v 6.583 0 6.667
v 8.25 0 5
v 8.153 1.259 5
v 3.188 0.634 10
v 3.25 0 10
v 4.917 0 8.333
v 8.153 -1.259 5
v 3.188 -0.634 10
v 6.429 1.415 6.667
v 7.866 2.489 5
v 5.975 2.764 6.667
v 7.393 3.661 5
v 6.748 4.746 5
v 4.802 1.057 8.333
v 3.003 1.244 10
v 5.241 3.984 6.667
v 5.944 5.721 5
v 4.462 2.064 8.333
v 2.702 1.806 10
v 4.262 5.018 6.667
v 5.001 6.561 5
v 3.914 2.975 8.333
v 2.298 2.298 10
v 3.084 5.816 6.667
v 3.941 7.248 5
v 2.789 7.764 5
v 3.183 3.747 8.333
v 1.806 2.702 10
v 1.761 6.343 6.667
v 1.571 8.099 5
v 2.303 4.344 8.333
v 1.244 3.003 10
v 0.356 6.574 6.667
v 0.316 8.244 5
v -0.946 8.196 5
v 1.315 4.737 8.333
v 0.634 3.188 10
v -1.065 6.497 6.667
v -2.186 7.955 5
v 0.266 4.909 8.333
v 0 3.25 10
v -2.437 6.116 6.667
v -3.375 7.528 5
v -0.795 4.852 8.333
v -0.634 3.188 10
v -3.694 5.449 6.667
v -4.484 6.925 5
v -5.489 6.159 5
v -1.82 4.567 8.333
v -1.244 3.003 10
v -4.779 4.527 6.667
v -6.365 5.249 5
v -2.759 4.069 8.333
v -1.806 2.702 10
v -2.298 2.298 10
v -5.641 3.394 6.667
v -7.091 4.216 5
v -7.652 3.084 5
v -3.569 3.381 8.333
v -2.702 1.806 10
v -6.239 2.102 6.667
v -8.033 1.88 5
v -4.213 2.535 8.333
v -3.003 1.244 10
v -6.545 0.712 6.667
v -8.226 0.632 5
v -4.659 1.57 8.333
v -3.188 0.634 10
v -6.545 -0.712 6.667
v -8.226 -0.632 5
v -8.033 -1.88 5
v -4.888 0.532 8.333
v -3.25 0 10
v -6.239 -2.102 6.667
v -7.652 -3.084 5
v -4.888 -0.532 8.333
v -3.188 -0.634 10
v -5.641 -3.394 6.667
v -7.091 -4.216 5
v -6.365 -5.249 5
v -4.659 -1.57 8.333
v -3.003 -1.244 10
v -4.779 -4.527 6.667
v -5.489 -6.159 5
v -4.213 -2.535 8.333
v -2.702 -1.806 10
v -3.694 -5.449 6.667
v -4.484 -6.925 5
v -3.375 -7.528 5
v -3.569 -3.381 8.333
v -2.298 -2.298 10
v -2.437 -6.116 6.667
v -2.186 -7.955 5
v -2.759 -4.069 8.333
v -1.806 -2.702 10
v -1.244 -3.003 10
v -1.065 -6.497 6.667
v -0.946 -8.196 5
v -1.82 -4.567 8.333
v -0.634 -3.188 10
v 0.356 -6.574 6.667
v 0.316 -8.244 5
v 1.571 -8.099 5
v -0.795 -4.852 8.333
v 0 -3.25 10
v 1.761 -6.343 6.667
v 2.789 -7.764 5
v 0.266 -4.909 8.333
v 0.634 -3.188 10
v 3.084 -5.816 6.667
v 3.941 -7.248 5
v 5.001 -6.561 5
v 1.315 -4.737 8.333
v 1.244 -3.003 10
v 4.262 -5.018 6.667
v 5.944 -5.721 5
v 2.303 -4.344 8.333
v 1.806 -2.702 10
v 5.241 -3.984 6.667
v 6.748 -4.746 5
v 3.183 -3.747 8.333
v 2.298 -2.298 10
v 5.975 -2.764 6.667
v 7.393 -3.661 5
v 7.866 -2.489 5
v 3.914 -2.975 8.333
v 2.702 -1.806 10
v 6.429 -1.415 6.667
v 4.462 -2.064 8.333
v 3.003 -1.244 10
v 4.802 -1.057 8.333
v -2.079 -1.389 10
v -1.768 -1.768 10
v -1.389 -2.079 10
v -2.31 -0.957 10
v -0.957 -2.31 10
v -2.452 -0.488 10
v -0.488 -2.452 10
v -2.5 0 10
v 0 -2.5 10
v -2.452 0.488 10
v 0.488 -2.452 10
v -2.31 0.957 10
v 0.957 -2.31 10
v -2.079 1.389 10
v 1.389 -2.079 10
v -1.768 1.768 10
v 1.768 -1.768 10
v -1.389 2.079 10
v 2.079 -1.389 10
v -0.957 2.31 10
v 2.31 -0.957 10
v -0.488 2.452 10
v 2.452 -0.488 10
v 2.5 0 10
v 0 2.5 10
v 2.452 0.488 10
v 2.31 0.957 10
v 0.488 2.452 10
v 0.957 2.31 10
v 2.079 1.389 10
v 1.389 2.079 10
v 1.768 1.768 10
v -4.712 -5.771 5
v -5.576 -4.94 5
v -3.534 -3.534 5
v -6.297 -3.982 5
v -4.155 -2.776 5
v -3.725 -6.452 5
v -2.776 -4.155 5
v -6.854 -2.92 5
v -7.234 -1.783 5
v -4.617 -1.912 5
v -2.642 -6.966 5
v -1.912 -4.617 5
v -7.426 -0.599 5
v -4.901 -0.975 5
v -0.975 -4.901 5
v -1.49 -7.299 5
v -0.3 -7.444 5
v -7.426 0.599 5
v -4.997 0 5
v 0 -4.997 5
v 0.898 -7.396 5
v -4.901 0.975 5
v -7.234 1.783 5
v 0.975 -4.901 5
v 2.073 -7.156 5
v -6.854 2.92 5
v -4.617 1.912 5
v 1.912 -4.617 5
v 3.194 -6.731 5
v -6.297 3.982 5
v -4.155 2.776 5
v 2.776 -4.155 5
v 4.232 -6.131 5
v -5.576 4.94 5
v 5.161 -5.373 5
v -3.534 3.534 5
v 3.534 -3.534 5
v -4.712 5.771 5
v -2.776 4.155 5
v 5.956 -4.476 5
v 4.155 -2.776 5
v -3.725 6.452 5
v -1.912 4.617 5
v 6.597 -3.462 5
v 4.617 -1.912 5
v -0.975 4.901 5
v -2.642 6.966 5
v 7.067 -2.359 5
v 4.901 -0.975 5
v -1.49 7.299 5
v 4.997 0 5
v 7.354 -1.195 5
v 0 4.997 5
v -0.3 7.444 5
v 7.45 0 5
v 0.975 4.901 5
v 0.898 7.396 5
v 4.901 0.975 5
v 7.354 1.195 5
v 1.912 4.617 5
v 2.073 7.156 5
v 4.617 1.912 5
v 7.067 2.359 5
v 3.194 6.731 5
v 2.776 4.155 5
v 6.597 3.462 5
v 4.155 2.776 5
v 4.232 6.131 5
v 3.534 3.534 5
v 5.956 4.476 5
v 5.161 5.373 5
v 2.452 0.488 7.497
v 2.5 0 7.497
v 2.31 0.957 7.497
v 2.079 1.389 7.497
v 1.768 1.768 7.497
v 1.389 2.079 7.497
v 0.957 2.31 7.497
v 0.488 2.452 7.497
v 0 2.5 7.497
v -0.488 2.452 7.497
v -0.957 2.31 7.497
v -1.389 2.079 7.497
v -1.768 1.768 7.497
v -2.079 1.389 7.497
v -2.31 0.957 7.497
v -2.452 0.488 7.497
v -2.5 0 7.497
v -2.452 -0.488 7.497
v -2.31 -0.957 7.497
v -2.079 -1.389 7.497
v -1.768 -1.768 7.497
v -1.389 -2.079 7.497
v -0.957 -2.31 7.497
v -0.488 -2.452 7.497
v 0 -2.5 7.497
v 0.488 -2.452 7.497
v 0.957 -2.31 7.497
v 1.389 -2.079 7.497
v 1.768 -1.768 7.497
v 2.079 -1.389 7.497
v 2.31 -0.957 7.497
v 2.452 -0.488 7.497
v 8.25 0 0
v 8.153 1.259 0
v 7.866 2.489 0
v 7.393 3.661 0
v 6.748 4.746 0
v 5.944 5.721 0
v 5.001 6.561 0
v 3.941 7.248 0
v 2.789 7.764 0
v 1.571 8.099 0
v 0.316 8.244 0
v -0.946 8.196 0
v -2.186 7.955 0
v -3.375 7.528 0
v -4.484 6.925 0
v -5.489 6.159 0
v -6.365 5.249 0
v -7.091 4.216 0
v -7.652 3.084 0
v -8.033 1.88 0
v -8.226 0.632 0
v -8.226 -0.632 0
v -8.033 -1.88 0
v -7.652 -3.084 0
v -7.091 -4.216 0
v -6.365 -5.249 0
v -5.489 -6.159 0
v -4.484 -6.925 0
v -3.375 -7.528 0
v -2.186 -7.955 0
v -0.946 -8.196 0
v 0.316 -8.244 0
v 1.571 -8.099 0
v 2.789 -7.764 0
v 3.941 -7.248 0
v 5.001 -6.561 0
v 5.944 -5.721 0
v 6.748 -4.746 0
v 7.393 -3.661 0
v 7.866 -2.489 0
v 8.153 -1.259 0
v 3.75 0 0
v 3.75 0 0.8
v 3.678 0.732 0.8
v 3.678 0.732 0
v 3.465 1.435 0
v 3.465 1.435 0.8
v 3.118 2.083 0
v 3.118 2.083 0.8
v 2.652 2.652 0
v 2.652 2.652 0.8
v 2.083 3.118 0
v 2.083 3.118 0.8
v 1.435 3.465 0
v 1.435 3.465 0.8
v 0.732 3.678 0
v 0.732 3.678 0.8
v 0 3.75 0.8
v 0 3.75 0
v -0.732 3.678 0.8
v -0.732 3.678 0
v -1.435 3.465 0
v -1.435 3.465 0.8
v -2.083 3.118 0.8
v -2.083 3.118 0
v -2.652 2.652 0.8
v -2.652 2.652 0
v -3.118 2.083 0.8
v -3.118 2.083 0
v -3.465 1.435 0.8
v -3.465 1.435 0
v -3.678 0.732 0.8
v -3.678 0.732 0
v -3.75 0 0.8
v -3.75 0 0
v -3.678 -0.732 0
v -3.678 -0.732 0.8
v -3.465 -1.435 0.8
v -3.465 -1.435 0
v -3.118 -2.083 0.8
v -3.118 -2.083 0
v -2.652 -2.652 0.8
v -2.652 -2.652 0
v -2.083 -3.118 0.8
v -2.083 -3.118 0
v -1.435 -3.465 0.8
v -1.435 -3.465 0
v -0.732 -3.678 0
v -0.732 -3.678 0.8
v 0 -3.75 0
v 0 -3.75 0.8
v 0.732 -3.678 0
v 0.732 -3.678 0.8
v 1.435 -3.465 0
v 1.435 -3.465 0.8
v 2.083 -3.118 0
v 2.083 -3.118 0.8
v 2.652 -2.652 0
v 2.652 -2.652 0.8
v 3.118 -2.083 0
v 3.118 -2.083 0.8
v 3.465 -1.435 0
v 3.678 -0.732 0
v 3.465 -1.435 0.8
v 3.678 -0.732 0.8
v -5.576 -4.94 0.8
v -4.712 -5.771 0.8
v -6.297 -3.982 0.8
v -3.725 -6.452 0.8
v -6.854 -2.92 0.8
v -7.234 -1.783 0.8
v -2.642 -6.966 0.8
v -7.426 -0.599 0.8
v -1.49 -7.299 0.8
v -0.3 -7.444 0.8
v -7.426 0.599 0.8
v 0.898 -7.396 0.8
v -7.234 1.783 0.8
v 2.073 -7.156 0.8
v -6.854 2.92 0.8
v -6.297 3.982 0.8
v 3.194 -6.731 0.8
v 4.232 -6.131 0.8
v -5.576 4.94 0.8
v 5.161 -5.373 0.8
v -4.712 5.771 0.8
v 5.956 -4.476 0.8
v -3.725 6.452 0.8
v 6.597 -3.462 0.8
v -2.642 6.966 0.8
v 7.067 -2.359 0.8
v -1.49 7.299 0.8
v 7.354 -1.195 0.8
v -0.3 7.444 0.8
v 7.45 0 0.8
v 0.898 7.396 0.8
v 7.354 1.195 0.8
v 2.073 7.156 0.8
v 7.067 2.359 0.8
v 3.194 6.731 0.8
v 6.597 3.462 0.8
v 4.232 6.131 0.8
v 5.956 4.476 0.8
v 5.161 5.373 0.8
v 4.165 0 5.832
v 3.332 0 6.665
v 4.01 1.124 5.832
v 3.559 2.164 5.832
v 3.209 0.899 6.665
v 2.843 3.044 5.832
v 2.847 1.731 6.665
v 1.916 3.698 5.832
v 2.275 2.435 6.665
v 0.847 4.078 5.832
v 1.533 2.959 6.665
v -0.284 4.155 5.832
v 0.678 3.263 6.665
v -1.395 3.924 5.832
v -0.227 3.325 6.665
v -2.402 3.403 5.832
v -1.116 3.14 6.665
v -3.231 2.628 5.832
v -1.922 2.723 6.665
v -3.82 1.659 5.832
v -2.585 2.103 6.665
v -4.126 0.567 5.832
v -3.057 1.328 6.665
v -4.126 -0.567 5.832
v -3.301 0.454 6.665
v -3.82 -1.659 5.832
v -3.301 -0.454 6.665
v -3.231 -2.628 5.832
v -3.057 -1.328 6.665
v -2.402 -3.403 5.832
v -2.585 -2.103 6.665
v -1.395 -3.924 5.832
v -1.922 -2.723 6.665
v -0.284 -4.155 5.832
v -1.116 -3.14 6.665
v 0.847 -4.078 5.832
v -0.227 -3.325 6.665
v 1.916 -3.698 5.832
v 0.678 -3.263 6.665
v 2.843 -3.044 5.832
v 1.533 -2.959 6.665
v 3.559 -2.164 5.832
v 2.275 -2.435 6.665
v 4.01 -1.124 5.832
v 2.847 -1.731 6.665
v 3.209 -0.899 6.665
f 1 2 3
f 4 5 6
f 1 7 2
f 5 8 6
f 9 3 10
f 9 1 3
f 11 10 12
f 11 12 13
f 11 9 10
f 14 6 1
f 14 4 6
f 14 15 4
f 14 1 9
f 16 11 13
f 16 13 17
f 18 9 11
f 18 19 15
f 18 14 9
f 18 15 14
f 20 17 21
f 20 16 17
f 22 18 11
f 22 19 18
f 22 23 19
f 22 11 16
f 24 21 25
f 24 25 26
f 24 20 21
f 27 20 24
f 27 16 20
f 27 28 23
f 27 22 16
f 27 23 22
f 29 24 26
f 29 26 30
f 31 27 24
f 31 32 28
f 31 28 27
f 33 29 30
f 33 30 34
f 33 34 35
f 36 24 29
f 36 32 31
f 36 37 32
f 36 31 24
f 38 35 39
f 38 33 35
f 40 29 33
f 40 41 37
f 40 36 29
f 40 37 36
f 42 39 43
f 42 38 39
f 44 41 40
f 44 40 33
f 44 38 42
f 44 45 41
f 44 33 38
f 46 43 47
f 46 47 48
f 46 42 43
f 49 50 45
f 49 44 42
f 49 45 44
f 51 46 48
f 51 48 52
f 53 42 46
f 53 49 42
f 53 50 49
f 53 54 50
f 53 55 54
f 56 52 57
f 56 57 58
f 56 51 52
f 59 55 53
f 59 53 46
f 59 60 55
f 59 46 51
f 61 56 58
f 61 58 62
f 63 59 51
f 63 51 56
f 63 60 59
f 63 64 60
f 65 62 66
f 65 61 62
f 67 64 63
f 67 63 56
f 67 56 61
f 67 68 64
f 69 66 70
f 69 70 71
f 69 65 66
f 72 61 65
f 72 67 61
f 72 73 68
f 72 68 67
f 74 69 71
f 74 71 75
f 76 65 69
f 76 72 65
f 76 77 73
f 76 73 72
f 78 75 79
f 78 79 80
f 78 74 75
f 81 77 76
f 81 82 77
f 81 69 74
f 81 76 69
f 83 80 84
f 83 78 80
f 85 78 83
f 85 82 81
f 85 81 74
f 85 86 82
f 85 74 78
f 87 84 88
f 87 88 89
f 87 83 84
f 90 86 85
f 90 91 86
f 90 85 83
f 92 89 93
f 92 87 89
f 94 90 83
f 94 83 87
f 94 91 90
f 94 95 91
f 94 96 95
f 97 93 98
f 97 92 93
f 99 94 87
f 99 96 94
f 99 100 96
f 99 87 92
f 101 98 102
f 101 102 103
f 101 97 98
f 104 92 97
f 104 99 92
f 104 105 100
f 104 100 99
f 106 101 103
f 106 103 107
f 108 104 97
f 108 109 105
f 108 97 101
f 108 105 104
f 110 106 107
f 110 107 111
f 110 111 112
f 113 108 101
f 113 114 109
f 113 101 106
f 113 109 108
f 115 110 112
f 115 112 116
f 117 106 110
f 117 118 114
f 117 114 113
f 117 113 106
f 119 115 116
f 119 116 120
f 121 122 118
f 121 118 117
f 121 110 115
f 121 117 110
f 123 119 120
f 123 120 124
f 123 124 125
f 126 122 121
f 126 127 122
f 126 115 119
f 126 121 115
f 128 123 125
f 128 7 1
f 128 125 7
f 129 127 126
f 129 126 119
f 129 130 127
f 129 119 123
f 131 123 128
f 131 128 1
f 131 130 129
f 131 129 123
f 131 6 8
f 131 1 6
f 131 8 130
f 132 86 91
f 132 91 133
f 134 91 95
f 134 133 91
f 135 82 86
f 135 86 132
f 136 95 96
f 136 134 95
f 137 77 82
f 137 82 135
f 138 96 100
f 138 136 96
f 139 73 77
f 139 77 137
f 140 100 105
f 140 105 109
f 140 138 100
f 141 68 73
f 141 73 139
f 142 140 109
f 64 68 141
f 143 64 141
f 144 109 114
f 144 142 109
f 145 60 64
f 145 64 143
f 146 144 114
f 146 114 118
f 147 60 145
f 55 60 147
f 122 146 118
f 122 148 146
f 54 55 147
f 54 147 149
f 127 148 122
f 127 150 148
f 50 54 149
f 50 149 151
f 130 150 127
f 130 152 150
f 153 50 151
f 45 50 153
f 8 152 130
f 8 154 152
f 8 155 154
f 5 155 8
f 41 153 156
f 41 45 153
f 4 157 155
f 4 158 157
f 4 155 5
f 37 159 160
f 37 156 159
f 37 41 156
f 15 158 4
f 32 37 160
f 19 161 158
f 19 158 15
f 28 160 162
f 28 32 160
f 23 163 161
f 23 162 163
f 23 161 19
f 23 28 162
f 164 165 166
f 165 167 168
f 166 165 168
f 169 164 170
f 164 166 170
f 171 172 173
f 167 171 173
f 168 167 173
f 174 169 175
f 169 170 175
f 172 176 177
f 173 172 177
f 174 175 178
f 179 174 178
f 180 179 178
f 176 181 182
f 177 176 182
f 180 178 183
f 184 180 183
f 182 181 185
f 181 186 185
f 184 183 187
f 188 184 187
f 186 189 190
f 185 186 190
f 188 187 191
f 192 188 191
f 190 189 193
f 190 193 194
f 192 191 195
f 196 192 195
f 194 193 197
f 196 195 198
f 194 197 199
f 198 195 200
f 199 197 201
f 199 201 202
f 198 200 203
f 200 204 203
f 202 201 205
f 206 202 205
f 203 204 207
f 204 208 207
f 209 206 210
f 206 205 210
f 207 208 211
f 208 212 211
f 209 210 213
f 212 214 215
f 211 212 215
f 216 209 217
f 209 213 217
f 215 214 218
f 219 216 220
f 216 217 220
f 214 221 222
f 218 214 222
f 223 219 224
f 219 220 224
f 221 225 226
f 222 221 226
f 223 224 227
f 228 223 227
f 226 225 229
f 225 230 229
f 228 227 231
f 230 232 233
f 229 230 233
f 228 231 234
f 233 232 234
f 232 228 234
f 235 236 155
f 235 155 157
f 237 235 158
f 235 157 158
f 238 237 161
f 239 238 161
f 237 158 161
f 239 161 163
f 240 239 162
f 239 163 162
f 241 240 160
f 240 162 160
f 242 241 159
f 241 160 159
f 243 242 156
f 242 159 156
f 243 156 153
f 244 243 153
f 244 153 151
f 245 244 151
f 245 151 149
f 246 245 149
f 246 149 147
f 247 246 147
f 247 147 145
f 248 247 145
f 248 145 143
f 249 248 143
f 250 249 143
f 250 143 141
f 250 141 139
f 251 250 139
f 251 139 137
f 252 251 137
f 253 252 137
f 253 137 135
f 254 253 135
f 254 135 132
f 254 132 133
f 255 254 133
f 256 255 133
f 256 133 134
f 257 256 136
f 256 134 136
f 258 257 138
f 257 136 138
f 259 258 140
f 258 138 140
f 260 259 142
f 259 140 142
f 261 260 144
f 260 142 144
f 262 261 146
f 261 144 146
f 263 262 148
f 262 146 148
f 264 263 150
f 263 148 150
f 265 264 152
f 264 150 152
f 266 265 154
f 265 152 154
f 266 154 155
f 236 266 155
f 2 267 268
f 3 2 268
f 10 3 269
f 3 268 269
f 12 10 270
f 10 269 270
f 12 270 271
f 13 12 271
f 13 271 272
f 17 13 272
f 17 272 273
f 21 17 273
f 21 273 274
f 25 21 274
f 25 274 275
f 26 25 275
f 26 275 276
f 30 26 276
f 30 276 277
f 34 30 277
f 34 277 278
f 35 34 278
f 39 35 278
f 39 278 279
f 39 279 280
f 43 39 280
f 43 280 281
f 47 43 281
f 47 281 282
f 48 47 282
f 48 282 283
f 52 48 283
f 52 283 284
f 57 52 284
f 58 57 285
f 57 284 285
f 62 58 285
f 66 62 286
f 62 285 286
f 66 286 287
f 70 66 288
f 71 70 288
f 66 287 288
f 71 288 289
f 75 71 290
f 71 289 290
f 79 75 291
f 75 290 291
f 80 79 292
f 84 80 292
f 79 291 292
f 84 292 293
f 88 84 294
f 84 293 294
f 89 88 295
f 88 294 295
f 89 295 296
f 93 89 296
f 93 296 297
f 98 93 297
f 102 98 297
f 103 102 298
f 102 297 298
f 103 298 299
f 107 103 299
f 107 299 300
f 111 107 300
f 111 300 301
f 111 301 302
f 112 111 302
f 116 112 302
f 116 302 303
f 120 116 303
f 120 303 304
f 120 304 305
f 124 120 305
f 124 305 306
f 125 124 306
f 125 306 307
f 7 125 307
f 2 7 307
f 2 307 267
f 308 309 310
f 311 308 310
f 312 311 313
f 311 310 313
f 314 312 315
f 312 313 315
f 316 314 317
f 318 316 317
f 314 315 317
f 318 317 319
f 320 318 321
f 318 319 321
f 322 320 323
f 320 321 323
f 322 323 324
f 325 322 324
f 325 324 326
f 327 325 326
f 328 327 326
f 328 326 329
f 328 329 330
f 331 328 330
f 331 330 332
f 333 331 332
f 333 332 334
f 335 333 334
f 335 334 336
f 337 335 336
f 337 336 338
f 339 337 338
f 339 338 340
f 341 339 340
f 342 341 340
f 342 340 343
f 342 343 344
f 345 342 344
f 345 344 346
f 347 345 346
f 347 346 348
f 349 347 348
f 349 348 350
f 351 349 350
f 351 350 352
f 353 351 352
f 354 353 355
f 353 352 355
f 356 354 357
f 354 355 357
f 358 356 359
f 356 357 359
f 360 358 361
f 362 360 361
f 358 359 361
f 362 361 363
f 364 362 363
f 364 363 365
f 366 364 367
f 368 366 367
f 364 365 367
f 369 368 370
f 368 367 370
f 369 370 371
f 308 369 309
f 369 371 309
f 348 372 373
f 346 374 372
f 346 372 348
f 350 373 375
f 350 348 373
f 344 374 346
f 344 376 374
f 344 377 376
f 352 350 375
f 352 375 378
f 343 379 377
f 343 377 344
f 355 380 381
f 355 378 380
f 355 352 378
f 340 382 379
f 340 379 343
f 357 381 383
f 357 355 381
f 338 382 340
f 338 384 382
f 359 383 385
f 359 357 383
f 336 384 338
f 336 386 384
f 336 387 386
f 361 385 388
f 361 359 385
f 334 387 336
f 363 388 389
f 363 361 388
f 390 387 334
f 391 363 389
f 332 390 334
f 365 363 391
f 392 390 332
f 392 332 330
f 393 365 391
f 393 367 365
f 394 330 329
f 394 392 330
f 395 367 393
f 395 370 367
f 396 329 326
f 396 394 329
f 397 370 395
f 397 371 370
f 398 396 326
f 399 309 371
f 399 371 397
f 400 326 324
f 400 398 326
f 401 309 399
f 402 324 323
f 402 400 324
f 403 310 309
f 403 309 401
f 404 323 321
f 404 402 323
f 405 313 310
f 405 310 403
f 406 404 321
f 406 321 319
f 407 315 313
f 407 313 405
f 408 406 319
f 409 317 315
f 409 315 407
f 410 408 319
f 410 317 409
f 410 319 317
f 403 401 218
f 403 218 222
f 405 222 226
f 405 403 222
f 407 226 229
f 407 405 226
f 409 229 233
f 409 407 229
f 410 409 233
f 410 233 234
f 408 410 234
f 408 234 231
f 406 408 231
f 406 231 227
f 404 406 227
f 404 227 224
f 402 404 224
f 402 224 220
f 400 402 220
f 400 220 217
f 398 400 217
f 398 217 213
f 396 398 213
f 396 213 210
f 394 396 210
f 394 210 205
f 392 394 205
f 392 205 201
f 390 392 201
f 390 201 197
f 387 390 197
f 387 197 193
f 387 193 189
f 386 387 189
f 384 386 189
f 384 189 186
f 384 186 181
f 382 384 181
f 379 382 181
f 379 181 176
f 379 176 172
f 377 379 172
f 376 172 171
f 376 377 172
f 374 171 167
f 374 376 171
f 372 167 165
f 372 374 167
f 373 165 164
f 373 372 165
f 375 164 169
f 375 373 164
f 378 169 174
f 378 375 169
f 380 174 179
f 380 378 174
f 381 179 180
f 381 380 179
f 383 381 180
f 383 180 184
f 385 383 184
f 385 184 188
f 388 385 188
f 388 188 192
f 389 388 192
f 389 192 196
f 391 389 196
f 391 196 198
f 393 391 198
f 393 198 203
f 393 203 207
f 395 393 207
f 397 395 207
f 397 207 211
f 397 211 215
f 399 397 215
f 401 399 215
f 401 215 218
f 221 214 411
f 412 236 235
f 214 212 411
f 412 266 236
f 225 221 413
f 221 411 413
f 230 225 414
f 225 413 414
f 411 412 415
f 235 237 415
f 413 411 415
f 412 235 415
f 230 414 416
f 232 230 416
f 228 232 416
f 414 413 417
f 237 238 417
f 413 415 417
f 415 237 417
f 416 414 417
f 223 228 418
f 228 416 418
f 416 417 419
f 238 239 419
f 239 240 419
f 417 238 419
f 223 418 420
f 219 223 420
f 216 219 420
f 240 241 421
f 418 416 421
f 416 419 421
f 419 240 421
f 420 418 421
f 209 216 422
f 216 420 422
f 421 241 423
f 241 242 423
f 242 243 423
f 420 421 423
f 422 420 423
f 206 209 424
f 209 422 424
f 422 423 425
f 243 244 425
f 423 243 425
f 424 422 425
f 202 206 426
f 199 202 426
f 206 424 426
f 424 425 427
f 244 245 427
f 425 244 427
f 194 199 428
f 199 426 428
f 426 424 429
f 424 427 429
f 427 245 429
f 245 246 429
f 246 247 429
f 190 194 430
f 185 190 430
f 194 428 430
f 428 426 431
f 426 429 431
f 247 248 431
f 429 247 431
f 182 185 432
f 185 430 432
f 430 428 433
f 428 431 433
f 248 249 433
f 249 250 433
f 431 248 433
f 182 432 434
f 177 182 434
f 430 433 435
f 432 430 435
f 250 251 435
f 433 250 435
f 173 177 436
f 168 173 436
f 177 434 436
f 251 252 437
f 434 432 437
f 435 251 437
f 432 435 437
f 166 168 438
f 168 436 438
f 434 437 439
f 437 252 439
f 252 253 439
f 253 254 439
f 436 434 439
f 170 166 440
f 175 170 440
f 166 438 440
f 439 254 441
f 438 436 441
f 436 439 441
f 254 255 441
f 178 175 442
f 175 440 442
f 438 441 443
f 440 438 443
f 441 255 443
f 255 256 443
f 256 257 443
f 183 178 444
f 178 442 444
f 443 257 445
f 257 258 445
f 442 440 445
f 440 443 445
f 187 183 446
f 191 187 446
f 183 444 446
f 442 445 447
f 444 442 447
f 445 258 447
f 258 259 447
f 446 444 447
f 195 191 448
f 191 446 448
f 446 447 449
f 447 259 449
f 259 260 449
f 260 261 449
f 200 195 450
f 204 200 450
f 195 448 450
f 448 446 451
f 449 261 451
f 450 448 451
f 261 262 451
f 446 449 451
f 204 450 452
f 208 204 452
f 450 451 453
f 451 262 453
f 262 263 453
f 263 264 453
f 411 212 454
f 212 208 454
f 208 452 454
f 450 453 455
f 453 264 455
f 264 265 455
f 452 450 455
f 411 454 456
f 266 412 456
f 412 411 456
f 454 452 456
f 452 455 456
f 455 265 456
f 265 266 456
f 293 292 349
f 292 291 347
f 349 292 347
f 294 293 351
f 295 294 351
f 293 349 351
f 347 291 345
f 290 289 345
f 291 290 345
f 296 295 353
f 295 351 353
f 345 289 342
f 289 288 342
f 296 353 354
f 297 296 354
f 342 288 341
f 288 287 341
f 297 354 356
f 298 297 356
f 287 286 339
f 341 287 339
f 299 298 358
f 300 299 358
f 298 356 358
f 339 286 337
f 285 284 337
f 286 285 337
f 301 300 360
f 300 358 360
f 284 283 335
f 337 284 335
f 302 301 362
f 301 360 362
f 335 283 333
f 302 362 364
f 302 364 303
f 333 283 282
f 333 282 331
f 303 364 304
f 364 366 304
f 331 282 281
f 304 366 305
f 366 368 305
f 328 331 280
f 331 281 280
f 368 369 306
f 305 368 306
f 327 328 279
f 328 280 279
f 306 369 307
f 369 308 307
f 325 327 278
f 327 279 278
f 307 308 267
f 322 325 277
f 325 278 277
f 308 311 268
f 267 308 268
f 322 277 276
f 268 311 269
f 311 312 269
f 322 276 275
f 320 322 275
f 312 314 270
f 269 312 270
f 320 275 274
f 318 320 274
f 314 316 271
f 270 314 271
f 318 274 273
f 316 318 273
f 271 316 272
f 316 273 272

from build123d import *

# Parameters (mm, degrees)
F0_R      = 8.25
F1_DEPTH  = 5
F2_T      = -0.8
F3_R      = 3.75
F4_DEPTH  = 25
F5_R      = 8.25
F6_DEPTH  = 5
F7_SIZE   = 5
F8_T      = 2.3
F9_R      = 2.5
F10_DEPTH = 25


# Not quite as in the source:
# - a shell that OpenCascade refuses in one call is made with other operations: the cavity is built on its own and cut out


with BuildPart() as f1:
    # F0 (on Top) → F1 (new body)
    with BuildSketch(Plane.XY):
        Circle(F0_R)
    extrude(amount=F1_DEPTH)

    # F2
    f2_openings = [f1.faces().sort_by_distance(p)[0] for p in [
        (0, 0, 5),
    ]]
    offset(amount=F2_T, openings=f2_openings)

    # F3 (on face) → F4 (cut)
    with BuildSketch(Plane.XY.offset(0.8)):
        Circle(F3_R)
    extrude(amount=-F4_DEPTH, mode=Mode.SUBTRACT)

    # F5 (on face) → F6 (join)
    with BuildSketch(Plane.XY.offset(5)):
        Circle(F5_R)
    extrude(amount=F6_DEPTH)

    # F7
    f7_edges = [f1.edges().sort_by_distance(p)[0] for p in [
        (-8.25, 0, 10),
    ]]
    chamfer(f7_edges, length=F7_SIZE)

    # F8: shell of thickness 2.3, made by hand


with BuildPart() as f8_core1:
    # F8_t2: copy of F1
    add(f1.part)

    # the walls: a layer under each face that stays
    f8_faces = [f8_core1.faces().sort_by_distance(p)[0] for p in [
        (-8.25, 0, 2.5),
        (-5.75, 0, 7.5),
        (-5.5, -5.5, 0),
        (0, 0, 10),
        (-3.75, 0, 0.4),
        (-4.9666666667, -4.9666666667, 0.8),
        (-7.45, 0, 2.9),
    ]]
    thicken(f8_faces, amount=-F8_T, mode=Mode.SUBTRACT)

    # F8_s3 → F8_t4 (revolve, cut)
    with BuildSketch(Plane.XZ):
        Polygon((7.427, 0.823), (7.45, -1.5), (9.75, -1.5), (9.75, 0.8), align=None)
    revolve(axis=Axis((0, 0, 0.8), (0, 0, -1)), mode=Mode.SUBTRACT)


with BuildPart() as f1_1:
    add(f1.part)

    # what is left inside the walls is the cavity
    f8_cavity = [f8_core1.part.solids().sort_by_distance(p)[0] for p in [
        (-4.081045, 0, 5.883737),
    ]]
    add(f8_cavity, mode=Mode.SUBTRACT)

    # F9 (on face) → F10 (cut)
    with BuildSketch(Plane.XY.offset(10)):
        Circle(F9_R)
    extrude(amount=-F10_DEPTH, mode=Mode.SUBTRACT)


solid = f1_1.part
